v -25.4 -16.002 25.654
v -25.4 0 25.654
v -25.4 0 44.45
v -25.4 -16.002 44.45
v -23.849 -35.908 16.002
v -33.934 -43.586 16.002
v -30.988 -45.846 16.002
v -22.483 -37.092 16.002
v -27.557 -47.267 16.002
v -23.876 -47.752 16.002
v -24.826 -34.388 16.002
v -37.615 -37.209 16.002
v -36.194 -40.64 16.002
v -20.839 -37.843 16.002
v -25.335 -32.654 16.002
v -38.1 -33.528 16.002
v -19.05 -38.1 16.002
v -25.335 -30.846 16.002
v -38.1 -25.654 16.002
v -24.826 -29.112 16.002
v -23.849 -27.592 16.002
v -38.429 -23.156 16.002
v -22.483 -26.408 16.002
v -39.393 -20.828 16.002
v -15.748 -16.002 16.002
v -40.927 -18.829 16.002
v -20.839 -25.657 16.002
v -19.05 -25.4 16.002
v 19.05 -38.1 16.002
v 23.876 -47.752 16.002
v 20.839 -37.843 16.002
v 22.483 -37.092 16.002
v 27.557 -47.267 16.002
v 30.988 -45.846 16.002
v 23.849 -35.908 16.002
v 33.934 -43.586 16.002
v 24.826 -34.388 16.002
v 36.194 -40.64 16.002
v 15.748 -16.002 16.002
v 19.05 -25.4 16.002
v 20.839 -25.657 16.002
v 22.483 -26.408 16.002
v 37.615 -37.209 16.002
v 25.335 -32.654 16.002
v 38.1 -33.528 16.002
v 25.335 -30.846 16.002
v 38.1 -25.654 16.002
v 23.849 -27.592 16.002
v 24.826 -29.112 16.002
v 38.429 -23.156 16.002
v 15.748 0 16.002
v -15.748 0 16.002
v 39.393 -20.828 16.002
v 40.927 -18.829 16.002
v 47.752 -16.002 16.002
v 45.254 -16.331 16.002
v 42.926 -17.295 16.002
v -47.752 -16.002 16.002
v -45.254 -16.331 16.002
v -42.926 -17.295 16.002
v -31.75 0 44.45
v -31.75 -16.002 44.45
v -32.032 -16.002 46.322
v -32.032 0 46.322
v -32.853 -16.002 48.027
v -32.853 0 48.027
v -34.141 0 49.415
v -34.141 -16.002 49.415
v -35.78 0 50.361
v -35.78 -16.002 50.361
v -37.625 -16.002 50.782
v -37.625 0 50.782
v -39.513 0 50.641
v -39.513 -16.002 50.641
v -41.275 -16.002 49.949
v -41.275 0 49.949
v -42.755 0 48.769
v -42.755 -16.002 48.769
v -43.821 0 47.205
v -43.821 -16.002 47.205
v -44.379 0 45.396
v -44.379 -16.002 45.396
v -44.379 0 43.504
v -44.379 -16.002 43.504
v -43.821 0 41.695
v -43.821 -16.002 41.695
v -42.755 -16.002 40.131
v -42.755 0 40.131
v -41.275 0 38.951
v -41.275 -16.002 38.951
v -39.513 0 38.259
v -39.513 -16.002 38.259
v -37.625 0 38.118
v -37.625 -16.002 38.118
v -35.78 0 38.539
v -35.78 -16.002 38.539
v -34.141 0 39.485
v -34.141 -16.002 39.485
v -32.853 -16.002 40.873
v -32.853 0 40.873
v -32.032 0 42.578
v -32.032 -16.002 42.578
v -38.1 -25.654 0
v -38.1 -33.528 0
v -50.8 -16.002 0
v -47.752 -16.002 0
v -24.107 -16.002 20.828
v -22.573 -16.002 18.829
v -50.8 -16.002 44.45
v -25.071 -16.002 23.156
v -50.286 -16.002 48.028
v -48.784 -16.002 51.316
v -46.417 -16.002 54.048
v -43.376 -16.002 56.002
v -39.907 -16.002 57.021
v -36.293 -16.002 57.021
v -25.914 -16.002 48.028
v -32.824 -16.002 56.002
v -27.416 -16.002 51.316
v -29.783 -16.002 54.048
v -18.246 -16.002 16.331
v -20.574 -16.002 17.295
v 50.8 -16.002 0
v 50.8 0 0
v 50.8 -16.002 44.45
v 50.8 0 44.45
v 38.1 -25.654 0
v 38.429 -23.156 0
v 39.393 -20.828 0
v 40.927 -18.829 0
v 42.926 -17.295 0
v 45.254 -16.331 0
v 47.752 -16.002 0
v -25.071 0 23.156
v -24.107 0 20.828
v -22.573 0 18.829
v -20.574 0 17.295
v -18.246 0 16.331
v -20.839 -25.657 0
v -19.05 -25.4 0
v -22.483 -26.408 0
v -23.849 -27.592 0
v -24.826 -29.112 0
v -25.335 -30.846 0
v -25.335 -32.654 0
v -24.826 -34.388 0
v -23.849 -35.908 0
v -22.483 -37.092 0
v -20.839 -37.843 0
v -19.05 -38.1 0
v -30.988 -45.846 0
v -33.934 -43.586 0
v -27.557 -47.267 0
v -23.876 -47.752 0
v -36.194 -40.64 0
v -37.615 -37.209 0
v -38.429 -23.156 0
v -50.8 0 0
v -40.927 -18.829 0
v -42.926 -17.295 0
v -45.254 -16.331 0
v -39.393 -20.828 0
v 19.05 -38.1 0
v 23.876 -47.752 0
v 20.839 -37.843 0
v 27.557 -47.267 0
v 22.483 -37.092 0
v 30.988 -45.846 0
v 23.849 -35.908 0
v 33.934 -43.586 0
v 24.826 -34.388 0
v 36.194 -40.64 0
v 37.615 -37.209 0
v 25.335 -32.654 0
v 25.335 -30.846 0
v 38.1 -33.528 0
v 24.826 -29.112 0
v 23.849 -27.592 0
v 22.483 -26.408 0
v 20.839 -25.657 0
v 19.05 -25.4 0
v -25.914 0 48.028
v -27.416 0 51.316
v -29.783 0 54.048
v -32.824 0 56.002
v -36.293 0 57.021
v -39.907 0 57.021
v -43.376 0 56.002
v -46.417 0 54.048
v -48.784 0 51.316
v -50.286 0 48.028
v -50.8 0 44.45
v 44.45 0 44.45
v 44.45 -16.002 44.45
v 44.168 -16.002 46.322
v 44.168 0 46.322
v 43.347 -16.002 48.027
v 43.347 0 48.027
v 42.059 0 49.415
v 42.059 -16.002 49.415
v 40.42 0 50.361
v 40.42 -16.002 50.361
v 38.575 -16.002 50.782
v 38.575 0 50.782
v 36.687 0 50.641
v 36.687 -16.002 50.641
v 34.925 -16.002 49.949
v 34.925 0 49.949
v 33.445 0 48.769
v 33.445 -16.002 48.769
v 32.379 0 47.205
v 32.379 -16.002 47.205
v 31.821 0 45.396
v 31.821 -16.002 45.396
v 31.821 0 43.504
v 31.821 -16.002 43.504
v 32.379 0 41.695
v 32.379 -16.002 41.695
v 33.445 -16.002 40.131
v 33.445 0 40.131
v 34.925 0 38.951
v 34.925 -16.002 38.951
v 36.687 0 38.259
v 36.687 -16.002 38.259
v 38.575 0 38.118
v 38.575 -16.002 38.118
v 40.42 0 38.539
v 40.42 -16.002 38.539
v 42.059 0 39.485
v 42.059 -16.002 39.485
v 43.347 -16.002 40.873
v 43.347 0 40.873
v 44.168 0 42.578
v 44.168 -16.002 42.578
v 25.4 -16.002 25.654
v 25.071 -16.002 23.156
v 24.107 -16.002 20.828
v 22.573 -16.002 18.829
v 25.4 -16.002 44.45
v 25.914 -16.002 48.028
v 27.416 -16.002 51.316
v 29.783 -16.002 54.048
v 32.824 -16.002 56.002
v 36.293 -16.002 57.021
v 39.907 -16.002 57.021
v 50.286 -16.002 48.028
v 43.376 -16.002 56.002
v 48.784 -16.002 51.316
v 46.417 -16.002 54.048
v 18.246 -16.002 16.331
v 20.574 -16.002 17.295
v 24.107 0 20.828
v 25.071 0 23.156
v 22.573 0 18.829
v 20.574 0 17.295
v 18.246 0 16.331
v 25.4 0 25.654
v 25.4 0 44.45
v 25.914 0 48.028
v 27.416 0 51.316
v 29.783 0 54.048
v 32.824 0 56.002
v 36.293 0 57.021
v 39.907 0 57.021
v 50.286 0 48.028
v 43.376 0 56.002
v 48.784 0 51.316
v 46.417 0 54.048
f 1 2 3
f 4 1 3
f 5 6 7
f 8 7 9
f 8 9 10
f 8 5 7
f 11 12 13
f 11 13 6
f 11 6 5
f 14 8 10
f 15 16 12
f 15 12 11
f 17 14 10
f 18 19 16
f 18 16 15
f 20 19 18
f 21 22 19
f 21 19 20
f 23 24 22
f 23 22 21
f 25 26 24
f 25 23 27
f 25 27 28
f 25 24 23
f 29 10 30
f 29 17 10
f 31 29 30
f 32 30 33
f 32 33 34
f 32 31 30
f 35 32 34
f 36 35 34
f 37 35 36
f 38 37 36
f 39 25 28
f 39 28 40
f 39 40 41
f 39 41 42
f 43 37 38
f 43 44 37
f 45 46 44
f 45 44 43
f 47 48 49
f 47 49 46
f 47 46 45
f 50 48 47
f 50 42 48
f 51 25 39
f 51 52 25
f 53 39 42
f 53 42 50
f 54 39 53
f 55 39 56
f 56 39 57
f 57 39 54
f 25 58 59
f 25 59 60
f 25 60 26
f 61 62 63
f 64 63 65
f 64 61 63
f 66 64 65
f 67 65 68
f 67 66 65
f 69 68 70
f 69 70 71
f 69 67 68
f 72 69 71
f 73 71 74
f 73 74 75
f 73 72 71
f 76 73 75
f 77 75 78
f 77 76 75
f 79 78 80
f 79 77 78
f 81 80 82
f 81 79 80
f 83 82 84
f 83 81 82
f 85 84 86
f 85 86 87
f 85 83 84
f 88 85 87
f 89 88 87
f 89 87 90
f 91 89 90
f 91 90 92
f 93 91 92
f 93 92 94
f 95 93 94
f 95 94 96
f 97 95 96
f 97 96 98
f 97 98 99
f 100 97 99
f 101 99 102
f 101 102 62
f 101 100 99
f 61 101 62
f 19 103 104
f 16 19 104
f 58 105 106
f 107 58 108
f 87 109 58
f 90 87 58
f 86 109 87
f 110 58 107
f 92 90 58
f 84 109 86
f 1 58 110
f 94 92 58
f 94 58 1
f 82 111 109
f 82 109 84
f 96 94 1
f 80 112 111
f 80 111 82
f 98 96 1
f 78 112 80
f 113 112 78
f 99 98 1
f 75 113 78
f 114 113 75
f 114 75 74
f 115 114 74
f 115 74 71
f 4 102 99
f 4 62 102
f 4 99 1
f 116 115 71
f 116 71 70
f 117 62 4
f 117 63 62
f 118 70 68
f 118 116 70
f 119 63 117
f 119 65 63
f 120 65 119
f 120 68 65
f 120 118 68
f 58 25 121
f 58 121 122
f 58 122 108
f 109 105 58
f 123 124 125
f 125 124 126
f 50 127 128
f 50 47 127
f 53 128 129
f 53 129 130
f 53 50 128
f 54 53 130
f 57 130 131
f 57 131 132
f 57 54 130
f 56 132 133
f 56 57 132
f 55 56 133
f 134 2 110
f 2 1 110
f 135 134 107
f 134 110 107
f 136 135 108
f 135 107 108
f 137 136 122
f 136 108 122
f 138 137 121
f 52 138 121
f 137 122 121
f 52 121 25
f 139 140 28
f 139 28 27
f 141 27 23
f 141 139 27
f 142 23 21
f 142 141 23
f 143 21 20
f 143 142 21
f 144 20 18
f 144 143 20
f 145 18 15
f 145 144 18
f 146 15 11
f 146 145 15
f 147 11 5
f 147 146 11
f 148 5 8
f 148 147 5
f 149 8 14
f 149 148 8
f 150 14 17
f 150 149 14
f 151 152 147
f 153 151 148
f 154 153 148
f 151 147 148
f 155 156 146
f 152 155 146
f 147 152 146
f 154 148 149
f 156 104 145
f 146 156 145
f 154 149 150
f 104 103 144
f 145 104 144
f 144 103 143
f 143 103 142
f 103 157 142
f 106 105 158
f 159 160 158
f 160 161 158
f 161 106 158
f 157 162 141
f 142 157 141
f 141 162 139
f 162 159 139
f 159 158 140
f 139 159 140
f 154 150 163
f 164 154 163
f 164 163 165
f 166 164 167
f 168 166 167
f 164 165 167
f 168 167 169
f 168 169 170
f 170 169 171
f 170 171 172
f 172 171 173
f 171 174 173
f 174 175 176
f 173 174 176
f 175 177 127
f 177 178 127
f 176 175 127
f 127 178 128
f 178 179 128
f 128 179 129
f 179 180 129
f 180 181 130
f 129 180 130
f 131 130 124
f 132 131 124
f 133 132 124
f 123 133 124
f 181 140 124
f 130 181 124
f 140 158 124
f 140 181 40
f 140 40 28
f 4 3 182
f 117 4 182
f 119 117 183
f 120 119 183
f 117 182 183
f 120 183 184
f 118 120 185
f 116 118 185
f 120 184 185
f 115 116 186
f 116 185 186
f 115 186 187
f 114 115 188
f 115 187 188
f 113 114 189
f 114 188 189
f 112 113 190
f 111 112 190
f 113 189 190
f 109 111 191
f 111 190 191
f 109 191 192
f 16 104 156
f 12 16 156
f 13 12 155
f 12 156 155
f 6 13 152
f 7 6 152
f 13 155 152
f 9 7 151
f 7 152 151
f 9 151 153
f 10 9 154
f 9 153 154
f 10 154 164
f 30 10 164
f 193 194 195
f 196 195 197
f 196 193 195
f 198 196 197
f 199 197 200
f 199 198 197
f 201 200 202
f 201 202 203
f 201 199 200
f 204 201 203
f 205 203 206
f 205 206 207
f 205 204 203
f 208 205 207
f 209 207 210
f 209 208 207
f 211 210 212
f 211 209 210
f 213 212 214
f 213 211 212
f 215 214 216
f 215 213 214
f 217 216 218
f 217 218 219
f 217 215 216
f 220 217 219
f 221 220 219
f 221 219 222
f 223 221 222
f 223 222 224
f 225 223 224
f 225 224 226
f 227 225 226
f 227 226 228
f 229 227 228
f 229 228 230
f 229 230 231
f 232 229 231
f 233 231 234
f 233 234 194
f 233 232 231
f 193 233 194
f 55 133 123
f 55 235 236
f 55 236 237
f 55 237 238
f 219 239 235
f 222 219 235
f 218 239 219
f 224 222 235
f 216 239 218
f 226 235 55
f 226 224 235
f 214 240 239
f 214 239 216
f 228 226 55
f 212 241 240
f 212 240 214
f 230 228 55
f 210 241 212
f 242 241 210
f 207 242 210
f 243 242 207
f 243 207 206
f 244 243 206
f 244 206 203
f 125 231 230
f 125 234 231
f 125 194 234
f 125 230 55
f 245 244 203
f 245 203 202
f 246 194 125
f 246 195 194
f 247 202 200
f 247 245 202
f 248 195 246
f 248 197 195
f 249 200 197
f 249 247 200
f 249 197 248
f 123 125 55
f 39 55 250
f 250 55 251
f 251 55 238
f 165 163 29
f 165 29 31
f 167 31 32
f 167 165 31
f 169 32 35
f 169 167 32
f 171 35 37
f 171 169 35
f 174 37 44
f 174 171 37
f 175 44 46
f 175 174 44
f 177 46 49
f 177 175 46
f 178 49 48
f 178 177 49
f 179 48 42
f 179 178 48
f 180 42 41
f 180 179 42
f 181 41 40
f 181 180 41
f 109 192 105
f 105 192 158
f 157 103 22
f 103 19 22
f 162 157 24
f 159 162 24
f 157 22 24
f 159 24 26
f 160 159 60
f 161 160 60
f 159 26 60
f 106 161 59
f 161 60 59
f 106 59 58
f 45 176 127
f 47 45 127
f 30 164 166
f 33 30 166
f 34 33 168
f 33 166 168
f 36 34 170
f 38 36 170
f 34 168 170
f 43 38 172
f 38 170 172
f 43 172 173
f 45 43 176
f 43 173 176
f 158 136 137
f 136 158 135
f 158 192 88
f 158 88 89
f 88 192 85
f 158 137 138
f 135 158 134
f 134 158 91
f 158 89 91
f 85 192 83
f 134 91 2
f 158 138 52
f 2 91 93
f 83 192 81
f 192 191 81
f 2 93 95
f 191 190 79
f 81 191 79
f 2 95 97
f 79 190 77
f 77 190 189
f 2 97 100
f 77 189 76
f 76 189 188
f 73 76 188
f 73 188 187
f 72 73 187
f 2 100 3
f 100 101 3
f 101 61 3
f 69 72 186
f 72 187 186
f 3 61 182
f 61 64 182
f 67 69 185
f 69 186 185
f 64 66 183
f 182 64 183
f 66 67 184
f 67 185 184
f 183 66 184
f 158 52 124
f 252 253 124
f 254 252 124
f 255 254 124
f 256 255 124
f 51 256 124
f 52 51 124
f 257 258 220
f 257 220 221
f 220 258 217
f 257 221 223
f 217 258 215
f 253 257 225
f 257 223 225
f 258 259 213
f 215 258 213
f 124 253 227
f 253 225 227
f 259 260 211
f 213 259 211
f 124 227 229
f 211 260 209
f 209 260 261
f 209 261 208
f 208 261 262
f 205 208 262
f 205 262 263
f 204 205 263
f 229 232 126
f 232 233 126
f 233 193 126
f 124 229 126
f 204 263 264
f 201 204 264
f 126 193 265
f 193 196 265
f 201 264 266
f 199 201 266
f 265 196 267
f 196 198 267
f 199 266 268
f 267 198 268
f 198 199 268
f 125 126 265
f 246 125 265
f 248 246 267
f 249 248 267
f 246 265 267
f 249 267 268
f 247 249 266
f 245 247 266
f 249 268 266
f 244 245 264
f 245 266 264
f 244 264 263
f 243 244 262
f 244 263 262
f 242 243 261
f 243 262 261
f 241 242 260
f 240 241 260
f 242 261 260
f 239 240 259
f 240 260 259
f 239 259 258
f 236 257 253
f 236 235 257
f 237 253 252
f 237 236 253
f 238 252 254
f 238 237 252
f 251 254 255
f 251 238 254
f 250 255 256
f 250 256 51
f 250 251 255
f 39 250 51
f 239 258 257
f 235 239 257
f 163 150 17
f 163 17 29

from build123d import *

# Parameters (mm, degrees)
F0_R     = 6.35
F1_DEPTH = 16.002
F2_R     = 9.652
F5_DEPTH = 16.002
F6_R     = 9.652
F7_DEPTH = 57.151


with BuildPart() as f1:
    # F0 (on Front) → F1 (new body)
    with BuildSketch(Plane.XZ):
        with BuildLine():
            Line((-50.8, 0), (0, 0))
            Line((0, 0), (50.8, 0))
            Line((50.8, 0), (50.8, 44.45))
            ThreePointArc((50.8, 44.45), (38.1, 57.15), (25.4, 44.45))
            Line((25.4, 44.45), (25.4, 16.002))
            Line((25.4, 16.002), (0, 16.002))
            Line((0, 16.002), (-25.4, 16.002))
            Line((-25.4, 16.002), (-25.4, 44.45))
            ThreePointArc((-25.4, 44.45), (-38.1, 57.15), (-50.8, 44.45))
            Line((-50.8, 44.45), (-50.8, 0))
        make_face()
        with Locations((-38.1, 44.45)):
            Circle(F0_R, mode=Mode.SUBTRACT)
        with Locations((38.1, 44.45)):
            Circle(F0_R, mode=Mode.SUBTRACT)
    extrude(amount=F1_DEPTH)

    # F2
    f2_edges = [f1.edges().sort_by_distance(p)[0] for p in [
        (-25.4, -8.001, 16.002),
        (25.4, -8.001, 16.002),
    ]]
    fillet(f2_edges, radius=F2_R)

    # F3 (on Top) → F5 (join)
    with BuildSketch(Plane.XY):
        with BuildLine():
            Line((38.1, -16.002), (0, -16.002))
            Line((0, -16.002), (-38.1, -16.002))
            Line((-38.1, -16.002), (-38.1, -33.528))
            ThreePointArc((-38.1, -33.528), (-33.933887, -43.585887), (-23.876, -47.752))
            Line((-23.876, -47.752), (0, -47.752))
            Line((0, -47.752), (23.876, -47.752))
            ThreePointArc((23.876, -47.752), (33.933887, -43.585887), (38.1, -33.528))
            Line((38.1, -33.528), (38.1, -16.002))
        make_face()
    extrude(amount=F5_DEPTH)

    # F6
    f6_edges = [f1.edges().sort_by_distance(p)[0] for p in [
        (-38.1, -16.002, 8.001),
        (38.1, -16.002, 8.001),
    ]]
    fillet(f6_edges, radius=F6_R)

    # F4 (on Top) → F7 (cut, through all)
    with BuildSketch(Plane.XY):
        with BuildLine():
            Line((19.05, -25.4), (0, -25.4))
            Line((0, -25.4), (-19.05, -25.4))
            ThreePointArc((-19.05, -25.4), (-25.4, -31.75), (-19.05, -38.1))
            Line((-19.05, -38.1), (0, -38.1))
            Line((0, -38.1), (19.05, -38.1))
            ThreePointArc((19.05, -38.1), (25.4, -31.75), (19.05, -25.4))
        make_face()
    extrude(amount=F7_DEPTH, mode=Mode.SUBTRACT)


solid = f1.part
